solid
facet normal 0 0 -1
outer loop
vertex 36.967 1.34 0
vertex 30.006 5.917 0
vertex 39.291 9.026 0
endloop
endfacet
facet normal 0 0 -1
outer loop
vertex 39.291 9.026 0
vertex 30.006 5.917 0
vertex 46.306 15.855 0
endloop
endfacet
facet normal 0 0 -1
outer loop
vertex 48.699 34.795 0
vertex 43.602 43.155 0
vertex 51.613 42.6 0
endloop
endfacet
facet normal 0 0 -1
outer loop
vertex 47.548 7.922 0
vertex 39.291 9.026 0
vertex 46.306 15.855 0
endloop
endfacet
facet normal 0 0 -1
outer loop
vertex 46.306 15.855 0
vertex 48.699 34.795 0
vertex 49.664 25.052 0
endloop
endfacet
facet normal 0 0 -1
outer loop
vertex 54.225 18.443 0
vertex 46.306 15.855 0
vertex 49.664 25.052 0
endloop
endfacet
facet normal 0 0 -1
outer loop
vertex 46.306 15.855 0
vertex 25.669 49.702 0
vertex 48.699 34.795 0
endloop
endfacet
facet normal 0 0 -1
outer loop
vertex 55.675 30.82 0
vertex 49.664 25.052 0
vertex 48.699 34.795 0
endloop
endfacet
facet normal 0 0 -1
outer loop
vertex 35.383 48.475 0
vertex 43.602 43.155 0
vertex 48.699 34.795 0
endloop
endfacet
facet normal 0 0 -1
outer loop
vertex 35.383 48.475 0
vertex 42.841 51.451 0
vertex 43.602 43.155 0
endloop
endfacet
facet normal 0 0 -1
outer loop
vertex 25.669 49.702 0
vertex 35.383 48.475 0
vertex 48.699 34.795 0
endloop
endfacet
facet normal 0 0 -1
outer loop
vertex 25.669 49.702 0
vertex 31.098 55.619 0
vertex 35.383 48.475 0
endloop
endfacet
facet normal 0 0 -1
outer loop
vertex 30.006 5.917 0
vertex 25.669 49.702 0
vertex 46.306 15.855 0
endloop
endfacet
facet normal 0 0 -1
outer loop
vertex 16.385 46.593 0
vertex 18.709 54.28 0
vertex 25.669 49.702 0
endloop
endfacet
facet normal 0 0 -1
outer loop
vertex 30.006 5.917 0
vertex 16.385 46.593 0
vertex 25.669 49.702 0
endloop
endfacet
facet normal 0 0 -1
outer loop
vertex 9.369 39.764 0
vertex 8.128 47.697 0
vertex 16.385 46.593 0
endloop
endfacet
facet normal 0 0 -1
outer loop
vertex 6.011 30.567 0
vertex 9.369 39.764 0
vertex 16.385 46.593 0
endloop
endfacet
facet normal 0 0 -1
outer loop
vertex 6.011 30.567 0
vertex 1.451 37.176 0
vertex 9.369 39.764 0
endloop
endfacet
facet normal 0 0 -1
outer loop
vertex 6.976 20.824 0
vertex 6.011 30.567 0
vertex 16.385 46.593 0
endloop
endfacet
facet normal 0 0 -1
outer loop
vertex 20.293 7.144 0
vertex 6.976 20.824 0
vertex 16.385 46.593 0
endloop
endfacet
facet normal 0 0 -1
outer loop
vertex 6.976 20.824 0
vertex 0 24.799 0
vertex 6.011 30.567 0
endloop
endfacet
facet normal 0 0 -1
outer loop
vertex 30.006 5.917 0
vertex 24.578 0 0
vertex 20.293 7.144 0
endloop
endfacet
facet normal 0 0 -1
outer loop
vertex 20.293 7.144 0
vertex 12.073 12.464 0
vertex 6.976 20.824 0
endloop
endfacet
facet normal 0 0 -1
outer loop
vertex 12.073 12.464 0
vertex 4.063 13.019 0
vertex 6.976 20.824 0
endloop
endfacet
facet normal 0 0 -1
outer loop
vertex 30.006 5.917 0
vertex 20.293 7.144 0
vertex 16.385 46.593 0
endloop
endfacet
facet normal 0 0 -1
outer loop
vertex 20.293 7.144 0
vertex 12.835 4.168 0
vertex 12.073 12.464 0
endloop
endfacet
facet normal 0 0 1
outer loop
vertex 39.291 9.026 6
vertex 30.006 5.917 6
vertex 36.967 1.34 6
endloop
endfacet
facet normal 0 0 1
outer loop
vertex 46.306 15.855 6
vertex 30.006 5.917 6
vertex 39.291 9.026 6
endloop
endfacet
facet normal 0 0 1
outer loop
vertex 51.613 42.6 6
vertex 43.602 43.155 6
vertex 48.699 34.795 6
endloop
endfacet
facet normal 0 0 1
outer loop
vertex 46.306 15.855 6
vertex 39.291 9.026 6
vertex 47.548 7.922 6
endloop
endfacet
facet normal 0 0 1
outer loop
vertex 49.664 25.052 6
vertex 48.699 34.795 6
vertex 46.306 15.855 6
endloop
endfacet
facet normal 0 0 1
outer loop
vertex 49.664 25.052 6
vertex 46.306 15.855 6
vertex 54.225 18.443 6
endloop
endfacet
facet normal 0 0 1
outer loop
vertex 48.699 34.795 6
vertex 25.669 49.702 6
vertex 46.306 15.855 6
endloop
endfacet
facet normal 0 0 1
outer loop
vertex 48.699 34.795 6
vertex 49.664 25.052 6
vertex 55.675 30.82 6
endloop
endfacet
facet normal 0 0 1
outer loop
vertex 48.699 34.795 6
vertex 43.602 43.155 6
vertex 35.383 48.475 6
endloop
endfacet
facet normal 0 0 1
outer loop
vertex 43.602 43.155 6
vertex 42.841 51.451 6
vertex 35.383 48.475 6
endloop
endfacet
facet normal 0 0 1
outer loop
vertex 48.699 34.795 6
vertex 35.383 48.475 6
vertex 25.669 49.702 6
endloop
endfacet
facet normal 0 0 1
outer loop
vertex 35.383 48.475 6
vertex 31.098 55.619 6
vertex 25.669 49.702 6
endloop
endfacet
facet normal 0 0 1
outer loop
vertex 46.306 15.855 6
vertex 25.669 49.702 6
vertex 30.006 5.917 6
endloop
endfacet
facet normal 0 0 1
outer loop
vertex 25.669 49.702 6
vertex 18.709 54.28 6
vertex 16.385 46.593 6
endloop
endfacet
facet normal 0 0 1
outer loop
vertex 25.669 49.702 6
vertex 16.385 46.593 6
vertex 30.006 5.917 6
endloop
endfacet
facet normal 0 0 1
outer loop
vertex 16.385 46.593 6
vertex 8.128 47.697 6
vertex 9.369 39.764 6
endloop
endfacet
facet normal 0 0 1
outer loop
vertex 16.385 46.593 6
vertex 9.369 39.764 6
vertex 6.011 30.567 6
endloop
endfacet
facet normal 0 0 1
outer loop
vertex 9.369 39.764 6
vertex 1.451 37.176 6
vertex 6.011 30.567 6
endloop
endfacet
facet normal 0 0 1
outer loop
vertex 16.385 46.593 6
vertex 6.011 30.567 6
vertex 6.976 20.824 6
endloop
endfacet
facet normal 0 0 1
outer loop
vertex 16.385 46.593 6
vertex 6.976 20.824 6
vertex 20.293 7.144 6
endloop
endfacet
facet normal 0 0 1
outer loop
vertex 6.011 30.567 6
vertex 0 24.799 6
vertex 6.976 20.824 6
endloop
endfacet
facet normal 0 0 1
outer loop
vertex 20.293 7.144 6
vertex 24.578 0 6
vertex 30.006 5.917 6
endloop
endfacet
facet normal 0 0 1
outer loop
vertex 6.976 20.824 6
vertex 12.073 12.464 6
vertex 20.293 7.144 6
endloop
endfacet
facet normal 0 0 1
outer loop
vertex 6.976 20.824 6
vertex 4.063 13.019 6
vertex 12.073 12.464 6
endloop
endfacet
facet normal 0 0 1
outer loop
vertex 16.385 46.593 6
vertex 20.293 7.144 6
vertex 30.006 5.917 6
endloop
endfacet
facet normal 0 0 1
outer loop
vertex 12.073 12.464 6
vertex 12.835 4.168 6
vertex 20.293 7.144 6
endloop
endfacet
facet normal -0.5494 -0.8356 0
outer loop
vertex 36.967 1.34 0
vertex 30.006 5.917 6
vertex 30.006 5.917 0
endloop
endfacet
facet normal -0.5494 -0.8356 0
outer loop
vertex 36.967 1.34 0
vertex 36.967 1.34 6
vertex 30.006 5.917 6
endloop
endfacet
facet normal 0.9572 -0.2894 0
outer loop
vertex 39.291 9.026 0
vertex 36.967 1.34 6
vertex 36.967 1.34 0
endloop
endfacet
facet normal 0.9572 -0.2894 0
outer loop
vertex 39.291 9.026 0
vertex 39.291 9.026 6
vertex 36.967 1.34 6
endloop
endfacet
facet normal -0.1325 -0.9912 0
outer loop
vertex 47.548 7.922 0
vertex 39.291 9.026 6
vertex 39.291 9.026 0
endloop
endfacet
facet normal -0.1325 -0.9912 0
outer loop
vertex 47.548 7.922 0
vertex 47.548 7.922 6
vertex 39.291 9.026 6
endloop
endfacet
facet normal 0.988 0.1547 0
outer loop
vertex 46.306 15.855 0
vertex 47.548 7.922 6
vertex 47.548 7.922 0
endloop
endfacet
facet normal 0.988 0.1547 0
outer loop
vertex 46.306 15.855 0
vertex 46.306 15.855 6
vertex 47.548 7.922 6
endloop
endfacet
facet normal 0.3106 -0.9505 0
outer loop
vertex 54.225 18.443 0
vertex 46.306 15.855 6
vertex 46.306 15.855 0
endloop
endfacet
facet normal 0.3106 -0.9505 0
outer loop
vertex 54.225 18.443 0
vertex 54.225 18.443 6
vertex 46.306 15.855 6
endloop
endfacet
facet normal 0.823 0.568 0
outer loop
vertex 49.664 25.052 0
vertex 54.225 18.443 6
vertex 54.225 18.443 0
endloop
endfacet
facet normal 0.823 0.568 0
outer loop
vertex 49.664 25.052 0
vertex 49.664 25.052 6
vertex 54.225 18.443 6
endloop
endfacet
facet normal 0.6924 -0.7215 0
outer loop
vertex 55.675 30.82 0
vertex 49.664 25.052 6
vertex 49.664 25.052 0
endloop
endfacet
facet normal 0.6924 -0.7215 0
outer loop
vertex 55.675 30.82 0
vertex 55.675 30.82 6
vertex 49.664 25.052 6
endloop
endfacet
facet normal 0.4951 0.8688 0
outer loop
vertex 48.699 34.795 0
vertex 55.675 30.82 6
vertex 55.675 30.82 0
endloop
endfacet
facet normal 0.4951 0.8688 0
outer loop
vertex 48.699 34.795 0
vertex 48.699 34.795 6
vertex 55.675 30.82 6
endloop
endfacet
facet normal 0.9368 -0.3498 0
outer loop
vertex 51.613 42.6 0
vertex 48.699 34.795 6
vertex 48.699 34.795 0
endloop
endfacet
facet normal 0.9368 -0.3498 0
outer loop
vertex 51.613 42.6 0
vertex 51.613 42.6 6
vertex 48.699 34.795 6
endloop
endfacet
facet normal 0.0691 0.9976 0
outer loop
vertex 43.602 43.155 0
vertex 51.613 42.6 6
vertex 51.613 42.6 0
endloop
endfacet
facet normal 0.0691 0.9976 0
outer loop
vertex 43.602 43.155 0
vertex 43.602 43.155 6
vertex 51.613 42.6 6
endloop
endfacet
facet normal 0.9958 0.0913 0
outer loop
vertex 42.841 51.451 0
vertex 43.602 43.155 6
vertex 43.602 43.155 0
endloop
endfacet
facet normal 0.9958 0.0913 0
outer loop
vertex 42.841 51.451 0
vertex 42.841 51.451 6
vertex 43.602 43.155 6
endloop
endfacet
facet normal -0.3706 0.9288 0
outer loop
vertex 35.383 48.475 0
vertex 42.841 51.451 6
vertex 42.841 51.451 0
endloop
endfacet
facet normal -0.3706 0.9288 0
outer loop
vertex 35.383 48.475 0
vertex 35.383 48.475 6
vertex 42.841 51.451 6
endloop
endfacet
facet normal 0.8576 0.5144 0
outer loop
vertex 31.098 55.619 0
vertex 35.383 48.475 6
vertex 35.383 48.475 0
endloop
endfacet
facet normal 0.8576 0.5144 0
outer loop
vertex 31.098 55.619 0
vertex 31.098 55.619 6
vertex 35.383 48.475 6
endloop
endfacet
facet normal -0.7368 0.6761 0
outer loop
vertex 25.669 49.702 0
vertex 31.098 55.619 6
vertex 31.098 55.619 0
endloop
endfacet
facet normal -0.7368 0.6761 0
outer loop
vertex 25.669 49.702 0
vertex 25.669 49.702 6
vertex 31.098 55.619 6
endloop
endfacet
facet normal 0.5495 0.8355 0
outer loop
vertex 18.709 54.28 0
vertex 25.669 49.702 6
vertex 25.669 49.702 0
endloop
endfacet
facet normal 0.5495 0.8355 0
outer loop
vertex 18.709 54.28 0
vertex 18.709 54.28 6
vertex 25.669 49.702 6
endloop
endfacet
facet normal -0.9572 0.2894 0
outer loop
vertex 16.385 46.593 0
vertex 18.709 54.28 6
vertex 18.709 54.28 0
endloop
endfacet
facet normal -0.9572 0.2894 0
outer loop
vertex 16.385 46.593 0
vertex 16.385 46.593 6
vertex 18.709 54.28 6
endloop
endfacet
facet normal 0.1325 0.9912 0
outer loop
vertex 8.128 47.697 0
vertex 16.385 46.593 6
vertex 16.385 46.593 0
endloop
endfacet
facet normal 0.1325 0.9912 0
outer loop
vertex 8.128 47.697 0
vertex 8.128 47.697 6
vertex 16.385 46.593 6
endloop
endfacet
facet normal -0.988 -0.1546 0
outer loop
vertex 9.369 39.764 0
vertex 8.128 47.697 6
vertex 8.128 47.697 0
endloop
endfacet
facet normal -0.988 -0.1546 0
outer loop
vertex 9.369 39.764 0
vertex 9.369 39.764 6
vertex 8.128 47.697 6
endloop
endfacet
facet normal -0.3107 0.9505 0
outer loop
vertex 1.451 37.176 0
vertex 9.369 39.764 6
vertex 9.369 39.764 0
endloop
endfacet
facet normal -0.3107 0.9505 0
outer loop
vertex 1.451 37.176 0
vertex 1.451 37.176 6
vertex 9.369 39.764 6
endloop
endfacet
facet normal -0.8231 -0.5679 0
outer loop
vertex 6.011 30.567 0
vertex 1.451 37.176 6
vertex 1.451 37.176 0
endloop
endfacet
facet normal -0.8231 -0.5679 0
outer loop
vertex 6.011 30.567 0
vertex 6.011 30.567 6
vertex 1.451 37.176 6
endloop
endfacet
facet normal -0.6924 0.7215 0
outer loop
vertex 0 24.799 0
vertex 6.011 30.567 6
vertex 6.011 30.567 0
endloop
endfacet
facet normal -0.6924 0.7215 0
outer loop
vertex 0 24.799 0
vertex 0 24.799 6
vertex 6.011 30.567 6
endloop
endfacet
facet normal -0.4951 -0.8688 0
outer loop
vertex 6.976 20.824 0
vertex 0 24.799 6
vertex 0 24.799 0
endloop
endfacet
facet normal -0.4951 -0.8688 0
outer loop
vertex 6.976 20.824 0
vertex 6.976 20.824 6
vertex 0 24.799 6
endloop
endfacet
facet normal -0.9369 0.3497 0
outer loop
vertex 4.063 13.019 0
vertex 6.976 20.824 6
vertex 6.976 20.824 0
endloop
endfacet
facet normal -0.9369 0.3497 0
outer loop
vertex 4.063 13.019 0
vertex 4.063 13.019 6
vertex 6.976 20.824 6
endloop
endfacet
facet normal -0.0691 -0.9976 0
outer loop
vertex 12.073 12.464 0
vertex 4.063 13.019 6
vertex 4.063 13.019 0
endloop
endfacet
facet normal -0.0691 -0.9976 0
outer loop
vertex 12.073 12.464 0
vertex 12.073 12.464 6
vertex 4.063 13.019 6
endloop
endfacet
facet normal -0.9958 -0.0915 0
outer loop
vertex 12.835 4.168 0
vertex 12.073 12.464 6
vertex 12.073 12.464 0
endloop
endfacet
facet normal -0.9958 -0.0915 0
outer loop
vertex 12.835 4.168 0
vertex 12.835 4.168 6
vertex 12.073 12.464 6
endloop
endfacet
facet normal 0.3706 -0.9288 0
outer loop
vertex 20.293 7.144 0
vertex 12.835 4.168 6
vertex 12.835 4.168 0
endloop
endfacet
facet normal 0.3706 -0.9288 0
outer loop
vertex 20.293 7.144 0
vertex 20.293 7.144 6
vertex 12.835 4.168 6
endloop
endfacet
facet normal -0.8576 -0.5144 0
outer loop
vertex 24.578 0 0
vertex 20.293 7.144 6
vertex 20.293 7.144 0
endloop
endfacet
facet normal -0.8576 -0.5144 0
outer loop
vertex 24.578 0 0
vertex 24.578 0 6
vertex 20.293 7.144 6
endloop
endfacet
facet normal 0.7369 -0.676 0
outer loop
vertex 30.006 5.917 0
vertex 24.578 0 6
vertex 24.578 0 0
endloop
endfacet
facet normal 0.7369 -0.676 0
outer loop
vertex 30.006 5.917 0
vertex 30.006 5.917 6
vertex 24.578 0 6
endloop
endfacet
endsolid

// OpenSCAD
$fn = 32;

// ----------------------------------------------------------------------
// Chain sprocket: 14 teeth, 22 mm root radius
// ----------------------------------------------------------------------

// --- parameters (mm) ---
profile_height = 6;       // extrusion height
profile_points = 28;      // points of the closed outline

profile = [[49.664, 25.052], [55.675, 30.82], [48.699, 34.795], [51.613, 42.6], [43.602, 43.155], [42.841, 51.451], [35.383, 48.475], [31.098, 55.619], [25.669, 49.702], [18.709, 54.28], [16.385, 46.593], [8.128, 47.697], [9.369, 39.764], [1.451, 37.176], [6.011, 30.567], [0, 24.799], [6.976, 20.824], [4.063, 13.019], [12.073, 12.464], [12.835, 4.168], [20.293, 7.144], [24.578, 0], [30.006, 5.917], [36.967, 1.34], [39.291, 9.026], [47.548, 7.922], [46.306, 15.855], [54.225, 18.443]];  // single closed polygon, 28 points, counter clockwise

// --- the one profile operation ---
linear_extrude(height = profile_height) polygon(points = profile);
